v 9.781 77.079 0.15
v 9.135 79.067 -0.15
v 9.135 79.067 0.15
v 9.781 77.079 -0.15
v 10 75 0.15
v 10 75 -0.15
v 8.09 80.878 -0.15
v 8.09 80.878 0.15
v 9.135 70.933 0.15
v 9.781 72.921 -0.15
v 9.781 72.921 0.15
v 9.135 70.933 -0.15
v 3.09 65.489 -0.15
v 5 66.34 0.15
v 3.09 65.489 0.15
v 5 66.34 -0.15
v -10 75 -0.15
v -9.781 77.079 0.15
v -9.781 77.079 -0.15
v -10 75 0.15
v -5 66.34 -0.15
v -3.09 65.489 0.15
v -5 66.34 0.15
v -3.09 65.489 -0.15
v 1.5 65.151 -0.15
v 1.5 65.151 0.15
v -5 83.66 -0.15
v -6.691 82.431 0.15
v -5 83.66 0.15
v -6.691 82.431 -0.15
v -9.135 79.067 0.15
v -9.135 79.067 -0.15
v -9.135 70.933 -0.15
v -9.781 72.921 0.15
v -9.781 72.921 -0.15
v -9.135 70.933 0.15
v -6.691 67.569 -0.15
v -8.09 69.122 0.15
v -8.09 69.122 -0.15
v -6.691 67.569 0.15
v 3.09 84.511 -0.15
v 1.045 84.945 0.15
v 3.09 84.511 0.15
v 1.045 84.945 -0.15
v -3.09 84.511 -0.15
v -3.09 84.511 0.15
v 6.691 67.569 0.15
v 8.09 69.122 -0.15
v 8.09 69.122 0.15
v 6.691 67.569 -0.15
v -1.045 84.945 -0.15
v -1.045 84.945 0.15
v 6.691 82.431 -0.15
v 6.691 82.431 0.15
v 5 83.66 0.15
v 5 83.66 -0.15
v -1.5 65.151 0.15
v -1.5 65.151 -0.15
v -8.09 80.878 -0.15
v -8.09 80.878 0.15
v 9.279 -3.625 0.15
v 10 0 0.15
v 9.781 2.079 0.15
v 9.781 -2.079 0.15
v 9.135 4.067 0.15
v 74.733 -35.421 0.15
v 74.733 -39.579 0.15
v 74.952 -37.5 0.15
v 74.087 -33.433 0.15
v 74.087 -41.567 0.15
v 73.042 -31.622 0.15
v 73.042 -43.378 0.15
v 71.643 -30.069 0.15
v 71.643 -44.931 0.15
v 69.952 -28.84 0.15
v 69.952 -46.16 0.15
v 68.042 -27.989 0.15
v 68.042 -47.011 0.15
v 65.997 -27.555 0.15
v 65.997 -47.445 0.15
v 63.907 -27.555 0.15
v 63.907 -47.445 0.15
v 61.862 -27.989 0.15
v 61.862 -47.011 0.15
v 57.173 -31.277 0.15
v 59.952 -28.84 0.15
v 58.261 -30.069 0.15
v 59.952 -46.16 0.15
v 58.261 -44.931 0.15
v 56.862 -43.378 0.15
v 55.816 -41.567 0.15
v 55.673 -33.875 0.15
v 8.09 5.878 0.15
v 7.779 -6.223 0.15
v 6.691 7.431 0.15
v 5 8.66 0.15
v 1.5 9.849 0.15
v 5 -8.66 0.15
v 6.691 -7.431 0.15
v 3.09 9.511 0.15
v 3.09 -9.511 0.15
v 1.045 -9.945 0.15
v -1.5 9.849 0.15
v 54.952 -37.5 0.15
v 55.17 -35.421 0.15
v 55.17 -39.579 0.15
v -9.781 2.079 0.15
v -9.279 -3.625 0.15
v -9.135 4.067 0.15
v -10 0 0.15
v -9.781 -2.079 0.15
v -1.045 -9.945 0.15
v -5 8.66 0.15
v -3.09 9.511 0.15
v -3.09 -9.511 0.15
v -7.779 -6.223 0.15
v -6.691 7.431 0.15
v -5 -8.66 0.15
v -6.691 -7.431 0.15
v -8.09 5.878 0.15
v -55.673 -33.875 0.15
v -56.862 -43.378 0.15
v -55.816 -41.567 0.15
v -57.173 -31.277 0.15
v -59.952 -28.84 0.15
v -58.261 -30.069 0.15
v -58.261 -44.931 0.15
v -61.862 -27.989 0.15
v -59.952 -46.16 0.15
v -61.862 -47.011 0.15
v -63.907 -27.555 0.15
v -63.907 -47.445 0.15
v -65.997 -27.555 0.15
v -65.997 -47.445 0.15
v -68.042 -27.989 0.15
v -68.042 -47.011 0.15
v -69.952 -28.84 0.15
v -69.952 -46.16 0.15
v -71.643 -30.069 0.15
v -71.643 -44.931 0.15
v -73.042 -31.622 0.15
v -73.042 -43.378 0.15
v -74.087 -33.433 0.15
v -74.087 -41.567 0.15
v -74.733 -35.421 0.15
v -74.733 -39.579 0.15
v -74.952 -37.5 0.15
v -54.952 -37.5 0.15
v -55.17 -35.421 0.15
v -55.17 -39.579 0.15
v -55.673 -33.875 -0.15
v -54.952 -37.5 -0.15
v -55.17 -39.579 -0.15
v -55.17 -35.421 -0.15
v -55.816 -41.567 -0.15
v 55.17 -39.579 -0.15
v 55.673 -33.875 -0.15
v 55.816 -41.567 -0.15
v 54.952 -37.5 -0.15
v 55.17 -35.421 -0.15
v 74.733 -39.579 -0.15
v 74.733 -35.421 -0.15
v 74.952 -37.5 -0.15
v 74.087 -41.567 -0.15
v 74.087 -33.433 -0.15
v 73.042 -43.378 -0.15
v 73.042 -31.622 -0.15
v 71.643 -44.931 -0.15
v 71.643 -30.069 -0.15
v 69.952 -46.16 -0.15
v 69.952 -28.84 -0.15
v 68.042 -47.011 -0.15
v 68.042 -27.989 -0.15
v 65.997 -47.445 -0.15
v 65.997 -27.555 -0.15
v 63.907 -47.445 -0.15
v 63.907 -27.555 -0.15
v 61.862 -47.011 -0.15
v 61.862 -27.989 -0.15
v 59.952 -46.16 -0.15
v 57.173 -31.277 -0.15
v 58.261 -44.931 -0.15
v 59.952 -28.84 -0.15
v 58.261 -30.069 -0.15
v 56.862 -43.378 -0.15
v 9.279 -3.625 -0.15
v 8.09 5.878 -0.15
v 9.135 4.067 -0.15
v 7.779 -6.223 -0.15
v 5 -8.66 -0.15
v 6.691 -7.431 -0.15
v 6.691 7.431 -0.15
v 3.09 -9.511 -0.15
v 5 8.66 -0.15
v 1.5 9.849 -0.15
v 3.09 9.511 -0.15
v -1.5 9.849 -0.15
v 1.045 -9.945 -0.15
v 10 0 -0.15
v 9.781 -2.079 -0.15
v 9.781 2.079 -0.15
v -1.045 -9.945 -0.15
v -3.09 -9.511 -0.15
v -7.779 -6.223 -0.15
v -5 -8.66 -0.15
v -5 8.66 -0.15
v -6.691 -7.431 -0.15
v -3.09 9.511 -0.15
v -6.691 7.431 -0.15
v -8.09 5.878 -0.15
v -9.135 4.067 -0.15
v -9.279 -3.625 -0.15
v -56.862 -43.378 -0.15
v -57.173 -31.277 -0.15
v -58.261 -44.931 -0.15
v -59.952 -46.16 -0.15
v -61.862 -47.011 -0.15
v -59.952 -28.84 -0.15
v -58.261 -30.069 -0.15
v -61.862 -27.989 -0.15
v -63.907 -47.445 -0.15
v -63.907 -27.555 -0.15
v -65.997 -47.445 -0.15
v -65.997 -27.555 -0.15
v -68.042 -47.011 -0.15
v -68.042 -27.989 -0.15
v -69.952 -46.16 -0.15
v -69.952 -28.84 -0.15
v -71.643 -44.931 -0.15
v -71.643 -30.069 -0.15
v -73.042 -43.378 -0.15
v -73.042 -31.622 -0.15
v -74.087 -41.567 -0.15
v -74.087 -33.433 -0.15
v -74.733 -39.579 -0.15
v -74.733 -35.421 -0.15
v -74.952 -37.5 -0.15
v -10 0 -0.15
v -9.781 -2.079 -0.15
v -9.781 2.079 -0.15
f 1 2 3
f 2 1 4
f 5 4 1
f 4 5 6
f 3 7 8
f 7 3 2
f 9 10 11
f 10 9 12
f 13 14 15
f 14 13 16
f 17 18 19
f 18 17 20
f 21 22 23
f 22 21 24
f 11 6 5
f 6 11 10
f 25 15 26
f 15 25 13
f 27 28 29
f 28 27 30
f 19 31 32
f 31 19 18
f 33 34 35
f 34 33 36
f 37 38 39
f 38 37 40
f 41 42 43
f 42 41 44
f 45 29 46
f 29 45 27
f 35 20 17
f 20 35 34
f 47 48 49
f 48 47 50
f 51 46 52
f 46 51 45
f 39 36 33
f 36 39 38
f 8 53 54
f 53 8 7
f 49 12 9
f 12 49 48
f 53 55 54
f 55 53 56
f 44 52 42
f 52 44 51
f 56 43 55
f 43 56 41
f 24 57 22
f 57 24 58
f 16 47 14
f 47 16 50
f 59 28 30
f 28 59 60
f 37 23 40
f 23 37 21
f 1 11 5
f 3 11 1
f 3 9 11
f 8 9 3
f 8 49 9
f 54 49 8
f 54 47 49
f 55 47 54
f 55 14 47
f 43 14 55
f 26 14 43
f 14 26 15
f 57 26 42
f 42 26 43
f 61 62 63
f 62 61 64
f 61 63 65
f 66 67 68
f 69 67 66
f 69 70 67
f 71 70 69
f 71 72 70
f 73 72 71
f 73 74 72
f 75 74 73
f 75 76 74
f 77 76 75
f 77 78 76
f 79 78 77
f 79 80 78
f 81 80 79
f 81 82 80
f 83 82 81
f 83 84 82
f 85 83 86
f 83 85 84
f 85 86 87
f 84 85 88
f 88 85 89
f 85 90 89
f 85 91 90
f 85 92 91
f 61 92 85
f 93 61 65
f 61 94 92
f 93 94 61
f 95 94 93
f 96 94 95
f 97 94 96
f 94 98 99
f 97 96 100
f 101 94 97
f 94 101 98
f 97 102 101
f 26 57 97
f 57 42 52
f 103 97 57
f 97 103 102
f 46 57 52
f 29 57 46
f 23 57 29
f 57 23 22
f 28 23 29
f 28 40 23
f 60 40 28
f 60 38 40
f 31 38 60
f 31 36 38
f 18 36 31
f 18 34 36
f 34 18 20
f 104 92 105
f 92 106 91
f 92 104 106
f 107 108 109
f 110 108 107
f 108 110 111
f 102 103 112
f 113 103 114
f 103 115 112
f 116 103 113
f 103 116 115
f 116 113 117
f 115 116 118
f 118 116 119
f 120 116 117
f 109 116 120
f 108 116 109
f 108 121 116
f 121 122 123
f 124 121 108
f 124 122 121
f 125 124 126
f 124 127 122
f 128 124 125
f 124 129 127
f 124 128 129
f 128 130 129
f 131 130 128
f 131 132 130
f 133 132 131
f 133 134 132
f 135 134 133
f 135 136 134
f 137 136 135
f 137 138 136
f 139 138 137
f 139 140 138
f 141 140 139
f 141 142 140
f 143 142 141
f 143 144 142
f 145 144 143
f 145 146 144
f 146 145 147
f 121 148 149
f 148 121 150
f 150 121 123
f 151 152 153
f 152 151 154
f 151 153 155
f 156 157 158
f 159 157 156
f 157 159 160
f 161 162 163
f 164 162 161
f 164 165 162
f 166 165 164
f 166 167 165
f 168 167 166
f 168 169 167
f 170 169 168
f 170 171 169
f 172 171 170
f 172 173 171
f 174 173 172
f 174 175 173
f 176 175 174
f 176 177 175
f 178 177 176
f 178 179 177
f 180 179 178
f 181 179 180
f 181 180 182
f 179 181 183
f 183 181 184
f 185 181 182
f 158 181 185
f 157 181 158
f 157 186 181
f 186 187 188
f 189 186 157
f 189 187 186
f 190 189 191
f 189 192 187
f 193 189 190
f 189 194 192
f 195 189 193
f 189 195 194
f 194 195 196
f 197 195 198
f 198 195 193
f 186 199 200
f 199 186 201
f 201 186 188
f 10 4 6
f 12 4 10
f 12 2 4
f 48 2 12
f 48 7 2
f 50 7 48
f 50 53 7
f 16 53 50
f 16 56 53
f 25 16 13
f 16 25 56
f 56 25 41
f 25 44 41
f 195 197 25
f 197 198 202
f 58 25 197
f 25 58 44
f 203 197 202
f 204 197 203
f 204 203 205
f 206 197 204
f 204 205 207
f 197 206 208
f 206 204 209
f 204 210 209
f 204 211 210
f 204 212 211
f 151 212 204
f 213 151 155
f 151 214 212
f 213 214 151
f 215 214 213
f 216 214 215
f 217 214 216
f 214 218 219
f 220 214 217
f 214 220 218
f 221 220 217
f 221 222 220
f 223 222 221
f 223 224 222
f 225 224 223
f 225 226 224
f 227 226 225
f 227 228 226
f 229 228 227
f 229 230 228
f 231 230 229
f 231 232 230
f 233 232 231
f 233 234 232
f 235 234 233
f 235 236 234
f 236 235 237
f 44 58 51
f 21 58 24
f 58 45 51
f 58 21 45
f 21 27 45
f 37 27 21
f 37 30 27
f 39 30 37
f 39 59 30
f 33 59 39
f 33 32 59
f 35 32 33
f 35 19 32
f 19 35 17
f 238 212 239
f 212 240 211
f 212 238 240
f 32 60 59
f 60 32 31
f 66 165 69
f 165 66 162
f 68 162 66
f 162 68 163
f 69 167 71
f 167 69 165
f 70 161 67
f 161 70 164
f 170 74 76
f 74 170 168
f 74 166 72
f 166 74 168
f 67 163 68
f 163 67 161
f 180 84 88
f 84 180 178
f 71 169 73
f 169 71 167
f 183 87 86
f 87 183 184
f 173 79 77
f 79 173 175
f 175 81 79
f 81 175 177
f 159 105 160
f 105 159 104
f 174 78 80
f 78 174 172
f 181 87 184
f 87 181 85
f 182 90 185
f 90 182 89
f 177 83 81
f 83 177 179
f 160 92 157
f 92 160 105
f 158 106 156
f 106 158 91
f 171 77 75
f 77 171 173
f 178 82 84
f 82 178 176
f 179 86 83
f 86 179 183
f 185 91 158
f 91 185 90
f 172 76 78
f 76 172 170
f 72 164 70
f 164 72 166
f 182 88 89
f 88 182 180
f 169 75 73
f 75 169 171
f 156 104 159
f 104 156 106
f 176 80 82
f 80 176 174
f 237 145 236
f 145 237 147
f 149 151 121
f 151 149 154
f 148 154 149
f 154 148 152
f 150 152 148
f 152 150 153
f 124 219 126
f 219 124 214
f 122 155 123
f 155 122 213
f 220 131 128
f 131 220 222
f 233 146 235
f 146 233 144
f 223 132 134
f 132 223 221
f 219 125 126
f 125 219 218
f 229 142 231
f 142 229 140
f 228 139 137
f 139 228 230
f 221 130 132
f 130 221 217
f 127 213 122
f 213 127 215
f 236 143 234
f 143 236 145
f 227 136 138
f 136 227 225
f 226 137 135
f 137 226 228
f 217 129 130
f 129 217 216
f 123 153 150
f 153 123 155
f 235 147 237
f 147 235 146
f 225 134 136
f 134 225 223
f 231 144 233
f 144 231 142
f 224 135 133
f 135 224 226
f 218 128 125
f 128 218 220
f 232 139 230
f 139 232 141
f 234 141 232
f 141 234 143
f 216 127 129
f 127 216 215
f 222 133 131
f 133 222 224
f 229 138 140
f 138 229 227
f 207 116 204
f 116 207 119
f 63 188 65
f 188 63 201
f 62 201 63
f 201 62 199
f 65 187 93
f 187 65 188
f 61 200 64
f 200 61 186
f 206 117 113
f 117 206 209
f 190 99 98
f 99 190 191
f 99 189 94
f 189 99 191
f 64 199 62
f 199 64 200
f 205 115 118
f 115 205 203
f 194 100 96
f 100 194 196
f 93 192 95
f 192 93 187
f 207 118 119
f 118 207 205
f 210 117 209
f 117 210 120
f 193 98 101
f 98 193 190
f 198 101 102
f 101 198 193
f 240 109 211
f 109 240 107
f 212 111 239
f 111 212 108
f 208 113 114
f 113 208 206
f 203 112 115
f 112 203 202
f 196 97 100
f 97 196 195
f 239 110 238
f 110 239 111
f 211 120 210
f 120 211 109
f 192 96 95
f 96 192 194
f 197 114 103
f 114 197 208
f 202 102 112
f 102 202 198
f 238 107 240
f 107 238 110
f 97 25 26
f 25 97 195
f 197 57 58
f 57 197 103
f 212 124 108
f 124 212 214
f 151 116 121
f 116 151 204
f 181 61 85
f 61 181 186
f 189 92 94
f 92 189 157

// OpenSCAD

/* [Size] */
size = 170; //[1:500]

circle_diameter = 20; //[1:50]

module fourPoint1stLayerPrintTest()
{
    rsize = circle_diameter/2;
    xpos= size/2 - rsize;
    ypos = size/2 - rsize;
    
    union() {
        translate([0,ypos,0]){
              cylinder(r=rsize, h=0.3, center = true);
        }
        translate([cos(30)*xpos,-sin(30)*ypos,0]){
              cylinder(r=rsize, h=0.3, center = true);
        }
        translate([-cos(30)*xpos,-sin(30)*ypos,0]){
              cylinder(r=rsize, h=0.3, center = true);
        }
        cylinder(r=rsize, h=0.3, center = true);
        
        translate([0,ypos/2,0]){
              cube([3, size/2, 0.3], center = true);
        }
        translate([-cos(30)*xpos/2,-sin(30)*ypos/2,0]){
            rotate([0,0,30])
                cube([size/2, 3, 0.3], center = true);
        }
        translate([cos(30)*xpos/2, -sin(30)*ypos/2, 0]){
            rotate([0,0,-30])
                cube([size/2, 3, 0.3], center = true);
        }

    }
    
}

fourPoint1stLayerPrintTest();
